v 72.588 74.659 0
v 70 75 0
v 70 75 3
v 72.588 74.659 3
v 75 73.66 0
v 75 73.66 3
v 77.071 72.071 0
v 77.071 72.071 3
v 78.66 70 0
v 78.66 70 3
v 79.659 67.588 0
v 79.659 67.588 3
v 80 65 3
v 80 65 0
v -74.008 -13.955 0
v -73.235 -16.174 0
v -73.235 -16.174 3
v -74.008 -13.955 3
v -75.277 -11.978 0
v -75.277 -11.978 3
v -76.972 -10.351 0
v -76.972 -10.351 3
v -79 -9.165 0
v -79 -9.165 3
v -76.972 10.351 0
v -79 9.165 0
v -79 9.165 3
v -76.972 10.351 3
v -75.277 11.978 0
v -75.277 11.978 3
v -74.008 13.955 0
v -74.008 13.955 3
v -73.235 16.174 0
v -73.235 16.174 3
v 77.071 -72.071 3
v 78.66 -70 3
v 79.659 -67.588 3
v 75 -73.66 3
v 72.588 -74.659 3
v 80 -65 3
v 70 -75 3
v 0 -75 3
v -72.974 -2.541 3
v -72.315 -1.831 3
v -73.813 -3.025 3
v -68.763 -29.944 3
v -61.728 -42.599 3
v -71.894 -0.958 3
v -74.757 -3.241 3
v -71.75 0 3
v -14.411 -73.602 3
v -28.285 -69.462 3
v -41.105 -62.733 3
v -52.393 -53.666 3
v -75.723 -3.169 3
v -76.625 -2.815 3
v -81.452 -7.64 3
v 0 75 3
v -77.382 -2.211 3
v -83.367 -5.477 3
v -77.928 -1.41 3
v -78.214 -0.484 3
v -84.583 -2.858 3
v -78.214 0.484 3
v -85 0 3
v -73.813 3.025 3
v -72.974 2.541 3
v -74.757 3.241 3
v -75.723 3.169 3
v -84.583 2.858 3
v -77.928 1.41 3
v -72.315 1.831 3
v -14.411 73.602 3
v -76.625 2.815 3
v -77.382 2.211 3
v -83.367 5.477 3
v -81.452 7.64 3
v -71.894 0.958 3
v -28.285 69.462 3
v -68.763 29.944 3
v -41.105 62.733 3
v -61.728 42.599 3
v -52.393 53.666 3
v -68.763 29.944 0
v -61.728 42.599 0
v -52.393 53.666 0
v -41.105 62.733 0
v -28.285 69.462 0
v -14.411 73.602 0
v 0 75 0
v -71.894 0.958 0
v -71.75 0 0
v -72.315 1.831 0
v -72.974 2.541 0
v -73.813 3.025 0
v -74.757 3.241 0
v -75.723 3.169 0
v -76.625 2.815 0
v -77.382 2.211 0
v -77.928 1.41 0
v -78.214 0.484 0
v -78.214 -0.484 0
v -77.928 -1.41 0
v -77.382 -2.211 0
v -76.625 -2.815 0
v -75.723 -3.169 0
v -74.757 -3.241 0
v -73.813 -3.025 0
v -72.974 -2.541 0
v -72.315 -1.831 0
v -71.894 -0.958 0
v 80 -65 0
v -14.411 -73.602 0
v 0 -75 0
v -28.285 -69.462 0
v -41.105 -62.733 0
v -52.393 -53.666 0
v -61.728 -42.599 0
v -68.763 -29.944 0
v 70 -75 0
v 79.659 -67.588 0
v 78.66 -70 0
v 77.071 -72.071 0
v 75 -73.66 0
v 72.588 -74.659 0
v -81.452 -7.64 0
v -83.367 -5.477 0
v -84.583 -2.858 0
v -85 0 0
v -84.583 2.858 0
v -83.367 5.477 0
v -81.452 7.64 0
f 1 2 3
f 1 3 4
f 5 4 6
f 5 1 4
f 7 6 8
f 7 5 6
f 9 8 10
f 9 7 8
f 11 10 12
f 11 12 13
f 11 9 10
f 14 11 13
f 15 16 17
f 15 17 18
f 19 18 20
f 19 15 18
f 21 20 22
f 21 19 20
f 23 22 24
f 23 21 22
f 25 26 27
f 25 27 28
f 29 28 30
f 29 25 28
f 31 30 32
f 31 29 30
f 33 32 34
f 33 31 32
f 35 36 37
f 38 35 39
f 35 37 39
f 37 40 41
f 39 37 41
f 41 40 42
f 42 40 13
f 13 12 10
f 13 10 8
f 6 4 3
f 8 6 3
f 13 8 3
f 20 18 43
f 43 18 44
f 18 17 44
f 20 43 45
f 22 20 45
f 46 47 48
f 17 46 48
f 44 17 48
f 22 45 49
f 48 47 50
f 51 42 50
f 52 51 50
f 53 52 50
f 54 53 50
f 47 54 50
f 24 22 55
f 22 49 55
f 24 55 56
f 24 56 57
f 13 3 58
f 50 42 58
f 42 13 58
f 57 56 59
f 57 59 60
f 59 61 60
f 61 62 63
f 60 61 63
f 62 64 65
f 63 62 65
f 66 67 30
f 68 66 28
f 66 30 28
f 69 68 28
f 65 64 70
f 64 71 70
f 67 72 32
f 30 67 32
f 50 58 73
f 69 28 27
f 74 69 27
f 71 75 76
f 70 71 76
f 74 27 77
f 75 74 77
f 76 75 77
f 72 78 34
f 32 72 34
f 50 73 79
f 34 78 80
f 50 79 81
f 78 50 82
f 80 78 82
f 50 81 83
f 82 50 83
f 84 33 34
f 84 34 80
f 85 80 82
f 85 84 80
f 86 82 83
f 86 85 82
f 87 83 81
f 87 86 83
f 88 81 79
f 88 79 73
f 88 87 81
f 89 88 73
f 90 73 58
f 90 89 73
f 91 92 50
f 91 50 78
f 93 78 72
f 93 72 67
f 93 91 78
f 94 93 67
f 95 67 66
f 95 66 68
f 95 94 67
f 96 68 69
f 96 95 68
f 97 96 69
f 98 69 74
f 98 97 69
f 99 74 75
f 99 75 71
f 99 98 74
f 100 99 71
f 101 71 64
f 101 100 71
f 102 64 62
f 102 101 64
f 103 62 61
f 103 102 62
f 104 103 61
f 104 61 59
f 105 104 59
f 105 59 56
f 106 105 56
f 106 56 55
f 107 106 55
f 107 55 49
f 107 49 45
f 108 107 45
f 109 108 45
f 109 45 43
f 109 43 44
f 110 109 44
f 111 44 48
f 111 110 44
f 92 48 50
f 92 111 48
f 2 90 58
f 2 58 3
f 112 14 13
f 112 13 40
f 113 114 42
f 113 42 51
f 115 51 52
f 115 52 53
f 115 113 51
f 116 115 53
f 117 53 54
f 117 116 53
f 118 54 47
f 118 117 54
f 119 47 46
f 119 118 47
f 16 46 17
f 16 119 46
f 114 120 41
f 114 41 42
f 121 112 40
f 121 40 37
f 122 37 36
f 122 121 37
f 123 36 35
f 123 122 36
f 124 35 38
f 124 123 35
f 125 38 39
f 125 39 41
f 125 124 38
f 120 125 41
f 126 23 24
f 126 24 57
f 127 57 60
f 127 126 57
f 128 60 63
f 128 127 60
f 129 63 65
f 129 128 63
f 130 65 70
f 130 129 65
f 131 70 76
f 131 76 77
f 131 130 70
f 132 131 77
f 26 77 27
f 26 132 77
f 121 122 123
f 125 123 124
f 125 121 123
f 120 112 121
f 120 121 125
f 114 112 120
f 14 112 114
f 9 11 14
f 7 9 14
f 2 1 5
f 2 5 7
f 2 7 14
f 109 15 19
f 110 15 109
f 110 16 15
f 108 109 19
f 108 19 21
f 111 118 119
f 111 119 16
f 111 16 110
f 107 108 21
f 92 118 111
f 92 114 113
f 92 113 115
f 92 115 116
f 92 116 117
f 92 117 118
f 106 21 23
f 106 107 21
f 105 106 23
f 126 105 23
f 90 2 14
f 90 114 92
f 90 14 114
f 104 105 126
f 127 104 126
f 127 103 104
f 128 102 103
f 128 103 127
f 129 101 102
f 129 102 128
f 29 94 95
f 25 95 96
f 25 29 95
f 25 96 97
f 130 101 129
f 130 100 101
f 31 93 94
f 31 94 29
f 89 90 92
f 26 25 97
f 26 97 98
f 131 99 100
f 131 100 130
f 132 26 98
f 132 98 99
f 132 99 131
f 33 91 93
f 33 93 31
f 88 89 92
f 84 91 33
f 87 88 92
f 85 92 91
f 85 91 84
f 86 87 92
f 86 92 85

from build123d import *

# Parameters (mm, degrees)
SKETCH1_R        = 3.25
MAIN_PLATE_DEPTH = 3


with BuildPart() as part:
    # Sketch1 → Main Plate (new body)
    with BuildSketch(Plane.XY):
        with BuildLine():
            Line((0, 75), (70, 75))
            ThreePointArc((70, 75), (77.071067812, 72.071067812), (80, 65))
            Line((80, 65), (80, -65))
            ThreePointArc((80, -65), (77.071067812, -72.071067812), (70, -75))
            Line((70, -75), (0, -75))
            ThreePointArc((0, -75), (-46.967889335, -58.472364168), (-73.235294118, -16.17379657))
            ThreePointArc((-73.235294118, -16.17379657), (-75.276849165, -11.977906289), (-79, -9.16515139))
            ThreePointArc((-79, -9.16515139), (-85, 0), (-79, 9.16515139))
            ThreePointArc((-79, 9.16515139), (-75.276849165, 11.977906289), (-73.235294118, 16.17379657))
            ThreePointArc((-73.235294118, 16.17379657), (-46.967889335, 58.472364168), (0, 75))
        make_face()
        with Locations((-75, 0)):
            Circle(SKETCH1_R, mode=Mode.SUBTRACT)
    extrude(amount=MAIN_PLATE_DEPTH)


solid = part.part
